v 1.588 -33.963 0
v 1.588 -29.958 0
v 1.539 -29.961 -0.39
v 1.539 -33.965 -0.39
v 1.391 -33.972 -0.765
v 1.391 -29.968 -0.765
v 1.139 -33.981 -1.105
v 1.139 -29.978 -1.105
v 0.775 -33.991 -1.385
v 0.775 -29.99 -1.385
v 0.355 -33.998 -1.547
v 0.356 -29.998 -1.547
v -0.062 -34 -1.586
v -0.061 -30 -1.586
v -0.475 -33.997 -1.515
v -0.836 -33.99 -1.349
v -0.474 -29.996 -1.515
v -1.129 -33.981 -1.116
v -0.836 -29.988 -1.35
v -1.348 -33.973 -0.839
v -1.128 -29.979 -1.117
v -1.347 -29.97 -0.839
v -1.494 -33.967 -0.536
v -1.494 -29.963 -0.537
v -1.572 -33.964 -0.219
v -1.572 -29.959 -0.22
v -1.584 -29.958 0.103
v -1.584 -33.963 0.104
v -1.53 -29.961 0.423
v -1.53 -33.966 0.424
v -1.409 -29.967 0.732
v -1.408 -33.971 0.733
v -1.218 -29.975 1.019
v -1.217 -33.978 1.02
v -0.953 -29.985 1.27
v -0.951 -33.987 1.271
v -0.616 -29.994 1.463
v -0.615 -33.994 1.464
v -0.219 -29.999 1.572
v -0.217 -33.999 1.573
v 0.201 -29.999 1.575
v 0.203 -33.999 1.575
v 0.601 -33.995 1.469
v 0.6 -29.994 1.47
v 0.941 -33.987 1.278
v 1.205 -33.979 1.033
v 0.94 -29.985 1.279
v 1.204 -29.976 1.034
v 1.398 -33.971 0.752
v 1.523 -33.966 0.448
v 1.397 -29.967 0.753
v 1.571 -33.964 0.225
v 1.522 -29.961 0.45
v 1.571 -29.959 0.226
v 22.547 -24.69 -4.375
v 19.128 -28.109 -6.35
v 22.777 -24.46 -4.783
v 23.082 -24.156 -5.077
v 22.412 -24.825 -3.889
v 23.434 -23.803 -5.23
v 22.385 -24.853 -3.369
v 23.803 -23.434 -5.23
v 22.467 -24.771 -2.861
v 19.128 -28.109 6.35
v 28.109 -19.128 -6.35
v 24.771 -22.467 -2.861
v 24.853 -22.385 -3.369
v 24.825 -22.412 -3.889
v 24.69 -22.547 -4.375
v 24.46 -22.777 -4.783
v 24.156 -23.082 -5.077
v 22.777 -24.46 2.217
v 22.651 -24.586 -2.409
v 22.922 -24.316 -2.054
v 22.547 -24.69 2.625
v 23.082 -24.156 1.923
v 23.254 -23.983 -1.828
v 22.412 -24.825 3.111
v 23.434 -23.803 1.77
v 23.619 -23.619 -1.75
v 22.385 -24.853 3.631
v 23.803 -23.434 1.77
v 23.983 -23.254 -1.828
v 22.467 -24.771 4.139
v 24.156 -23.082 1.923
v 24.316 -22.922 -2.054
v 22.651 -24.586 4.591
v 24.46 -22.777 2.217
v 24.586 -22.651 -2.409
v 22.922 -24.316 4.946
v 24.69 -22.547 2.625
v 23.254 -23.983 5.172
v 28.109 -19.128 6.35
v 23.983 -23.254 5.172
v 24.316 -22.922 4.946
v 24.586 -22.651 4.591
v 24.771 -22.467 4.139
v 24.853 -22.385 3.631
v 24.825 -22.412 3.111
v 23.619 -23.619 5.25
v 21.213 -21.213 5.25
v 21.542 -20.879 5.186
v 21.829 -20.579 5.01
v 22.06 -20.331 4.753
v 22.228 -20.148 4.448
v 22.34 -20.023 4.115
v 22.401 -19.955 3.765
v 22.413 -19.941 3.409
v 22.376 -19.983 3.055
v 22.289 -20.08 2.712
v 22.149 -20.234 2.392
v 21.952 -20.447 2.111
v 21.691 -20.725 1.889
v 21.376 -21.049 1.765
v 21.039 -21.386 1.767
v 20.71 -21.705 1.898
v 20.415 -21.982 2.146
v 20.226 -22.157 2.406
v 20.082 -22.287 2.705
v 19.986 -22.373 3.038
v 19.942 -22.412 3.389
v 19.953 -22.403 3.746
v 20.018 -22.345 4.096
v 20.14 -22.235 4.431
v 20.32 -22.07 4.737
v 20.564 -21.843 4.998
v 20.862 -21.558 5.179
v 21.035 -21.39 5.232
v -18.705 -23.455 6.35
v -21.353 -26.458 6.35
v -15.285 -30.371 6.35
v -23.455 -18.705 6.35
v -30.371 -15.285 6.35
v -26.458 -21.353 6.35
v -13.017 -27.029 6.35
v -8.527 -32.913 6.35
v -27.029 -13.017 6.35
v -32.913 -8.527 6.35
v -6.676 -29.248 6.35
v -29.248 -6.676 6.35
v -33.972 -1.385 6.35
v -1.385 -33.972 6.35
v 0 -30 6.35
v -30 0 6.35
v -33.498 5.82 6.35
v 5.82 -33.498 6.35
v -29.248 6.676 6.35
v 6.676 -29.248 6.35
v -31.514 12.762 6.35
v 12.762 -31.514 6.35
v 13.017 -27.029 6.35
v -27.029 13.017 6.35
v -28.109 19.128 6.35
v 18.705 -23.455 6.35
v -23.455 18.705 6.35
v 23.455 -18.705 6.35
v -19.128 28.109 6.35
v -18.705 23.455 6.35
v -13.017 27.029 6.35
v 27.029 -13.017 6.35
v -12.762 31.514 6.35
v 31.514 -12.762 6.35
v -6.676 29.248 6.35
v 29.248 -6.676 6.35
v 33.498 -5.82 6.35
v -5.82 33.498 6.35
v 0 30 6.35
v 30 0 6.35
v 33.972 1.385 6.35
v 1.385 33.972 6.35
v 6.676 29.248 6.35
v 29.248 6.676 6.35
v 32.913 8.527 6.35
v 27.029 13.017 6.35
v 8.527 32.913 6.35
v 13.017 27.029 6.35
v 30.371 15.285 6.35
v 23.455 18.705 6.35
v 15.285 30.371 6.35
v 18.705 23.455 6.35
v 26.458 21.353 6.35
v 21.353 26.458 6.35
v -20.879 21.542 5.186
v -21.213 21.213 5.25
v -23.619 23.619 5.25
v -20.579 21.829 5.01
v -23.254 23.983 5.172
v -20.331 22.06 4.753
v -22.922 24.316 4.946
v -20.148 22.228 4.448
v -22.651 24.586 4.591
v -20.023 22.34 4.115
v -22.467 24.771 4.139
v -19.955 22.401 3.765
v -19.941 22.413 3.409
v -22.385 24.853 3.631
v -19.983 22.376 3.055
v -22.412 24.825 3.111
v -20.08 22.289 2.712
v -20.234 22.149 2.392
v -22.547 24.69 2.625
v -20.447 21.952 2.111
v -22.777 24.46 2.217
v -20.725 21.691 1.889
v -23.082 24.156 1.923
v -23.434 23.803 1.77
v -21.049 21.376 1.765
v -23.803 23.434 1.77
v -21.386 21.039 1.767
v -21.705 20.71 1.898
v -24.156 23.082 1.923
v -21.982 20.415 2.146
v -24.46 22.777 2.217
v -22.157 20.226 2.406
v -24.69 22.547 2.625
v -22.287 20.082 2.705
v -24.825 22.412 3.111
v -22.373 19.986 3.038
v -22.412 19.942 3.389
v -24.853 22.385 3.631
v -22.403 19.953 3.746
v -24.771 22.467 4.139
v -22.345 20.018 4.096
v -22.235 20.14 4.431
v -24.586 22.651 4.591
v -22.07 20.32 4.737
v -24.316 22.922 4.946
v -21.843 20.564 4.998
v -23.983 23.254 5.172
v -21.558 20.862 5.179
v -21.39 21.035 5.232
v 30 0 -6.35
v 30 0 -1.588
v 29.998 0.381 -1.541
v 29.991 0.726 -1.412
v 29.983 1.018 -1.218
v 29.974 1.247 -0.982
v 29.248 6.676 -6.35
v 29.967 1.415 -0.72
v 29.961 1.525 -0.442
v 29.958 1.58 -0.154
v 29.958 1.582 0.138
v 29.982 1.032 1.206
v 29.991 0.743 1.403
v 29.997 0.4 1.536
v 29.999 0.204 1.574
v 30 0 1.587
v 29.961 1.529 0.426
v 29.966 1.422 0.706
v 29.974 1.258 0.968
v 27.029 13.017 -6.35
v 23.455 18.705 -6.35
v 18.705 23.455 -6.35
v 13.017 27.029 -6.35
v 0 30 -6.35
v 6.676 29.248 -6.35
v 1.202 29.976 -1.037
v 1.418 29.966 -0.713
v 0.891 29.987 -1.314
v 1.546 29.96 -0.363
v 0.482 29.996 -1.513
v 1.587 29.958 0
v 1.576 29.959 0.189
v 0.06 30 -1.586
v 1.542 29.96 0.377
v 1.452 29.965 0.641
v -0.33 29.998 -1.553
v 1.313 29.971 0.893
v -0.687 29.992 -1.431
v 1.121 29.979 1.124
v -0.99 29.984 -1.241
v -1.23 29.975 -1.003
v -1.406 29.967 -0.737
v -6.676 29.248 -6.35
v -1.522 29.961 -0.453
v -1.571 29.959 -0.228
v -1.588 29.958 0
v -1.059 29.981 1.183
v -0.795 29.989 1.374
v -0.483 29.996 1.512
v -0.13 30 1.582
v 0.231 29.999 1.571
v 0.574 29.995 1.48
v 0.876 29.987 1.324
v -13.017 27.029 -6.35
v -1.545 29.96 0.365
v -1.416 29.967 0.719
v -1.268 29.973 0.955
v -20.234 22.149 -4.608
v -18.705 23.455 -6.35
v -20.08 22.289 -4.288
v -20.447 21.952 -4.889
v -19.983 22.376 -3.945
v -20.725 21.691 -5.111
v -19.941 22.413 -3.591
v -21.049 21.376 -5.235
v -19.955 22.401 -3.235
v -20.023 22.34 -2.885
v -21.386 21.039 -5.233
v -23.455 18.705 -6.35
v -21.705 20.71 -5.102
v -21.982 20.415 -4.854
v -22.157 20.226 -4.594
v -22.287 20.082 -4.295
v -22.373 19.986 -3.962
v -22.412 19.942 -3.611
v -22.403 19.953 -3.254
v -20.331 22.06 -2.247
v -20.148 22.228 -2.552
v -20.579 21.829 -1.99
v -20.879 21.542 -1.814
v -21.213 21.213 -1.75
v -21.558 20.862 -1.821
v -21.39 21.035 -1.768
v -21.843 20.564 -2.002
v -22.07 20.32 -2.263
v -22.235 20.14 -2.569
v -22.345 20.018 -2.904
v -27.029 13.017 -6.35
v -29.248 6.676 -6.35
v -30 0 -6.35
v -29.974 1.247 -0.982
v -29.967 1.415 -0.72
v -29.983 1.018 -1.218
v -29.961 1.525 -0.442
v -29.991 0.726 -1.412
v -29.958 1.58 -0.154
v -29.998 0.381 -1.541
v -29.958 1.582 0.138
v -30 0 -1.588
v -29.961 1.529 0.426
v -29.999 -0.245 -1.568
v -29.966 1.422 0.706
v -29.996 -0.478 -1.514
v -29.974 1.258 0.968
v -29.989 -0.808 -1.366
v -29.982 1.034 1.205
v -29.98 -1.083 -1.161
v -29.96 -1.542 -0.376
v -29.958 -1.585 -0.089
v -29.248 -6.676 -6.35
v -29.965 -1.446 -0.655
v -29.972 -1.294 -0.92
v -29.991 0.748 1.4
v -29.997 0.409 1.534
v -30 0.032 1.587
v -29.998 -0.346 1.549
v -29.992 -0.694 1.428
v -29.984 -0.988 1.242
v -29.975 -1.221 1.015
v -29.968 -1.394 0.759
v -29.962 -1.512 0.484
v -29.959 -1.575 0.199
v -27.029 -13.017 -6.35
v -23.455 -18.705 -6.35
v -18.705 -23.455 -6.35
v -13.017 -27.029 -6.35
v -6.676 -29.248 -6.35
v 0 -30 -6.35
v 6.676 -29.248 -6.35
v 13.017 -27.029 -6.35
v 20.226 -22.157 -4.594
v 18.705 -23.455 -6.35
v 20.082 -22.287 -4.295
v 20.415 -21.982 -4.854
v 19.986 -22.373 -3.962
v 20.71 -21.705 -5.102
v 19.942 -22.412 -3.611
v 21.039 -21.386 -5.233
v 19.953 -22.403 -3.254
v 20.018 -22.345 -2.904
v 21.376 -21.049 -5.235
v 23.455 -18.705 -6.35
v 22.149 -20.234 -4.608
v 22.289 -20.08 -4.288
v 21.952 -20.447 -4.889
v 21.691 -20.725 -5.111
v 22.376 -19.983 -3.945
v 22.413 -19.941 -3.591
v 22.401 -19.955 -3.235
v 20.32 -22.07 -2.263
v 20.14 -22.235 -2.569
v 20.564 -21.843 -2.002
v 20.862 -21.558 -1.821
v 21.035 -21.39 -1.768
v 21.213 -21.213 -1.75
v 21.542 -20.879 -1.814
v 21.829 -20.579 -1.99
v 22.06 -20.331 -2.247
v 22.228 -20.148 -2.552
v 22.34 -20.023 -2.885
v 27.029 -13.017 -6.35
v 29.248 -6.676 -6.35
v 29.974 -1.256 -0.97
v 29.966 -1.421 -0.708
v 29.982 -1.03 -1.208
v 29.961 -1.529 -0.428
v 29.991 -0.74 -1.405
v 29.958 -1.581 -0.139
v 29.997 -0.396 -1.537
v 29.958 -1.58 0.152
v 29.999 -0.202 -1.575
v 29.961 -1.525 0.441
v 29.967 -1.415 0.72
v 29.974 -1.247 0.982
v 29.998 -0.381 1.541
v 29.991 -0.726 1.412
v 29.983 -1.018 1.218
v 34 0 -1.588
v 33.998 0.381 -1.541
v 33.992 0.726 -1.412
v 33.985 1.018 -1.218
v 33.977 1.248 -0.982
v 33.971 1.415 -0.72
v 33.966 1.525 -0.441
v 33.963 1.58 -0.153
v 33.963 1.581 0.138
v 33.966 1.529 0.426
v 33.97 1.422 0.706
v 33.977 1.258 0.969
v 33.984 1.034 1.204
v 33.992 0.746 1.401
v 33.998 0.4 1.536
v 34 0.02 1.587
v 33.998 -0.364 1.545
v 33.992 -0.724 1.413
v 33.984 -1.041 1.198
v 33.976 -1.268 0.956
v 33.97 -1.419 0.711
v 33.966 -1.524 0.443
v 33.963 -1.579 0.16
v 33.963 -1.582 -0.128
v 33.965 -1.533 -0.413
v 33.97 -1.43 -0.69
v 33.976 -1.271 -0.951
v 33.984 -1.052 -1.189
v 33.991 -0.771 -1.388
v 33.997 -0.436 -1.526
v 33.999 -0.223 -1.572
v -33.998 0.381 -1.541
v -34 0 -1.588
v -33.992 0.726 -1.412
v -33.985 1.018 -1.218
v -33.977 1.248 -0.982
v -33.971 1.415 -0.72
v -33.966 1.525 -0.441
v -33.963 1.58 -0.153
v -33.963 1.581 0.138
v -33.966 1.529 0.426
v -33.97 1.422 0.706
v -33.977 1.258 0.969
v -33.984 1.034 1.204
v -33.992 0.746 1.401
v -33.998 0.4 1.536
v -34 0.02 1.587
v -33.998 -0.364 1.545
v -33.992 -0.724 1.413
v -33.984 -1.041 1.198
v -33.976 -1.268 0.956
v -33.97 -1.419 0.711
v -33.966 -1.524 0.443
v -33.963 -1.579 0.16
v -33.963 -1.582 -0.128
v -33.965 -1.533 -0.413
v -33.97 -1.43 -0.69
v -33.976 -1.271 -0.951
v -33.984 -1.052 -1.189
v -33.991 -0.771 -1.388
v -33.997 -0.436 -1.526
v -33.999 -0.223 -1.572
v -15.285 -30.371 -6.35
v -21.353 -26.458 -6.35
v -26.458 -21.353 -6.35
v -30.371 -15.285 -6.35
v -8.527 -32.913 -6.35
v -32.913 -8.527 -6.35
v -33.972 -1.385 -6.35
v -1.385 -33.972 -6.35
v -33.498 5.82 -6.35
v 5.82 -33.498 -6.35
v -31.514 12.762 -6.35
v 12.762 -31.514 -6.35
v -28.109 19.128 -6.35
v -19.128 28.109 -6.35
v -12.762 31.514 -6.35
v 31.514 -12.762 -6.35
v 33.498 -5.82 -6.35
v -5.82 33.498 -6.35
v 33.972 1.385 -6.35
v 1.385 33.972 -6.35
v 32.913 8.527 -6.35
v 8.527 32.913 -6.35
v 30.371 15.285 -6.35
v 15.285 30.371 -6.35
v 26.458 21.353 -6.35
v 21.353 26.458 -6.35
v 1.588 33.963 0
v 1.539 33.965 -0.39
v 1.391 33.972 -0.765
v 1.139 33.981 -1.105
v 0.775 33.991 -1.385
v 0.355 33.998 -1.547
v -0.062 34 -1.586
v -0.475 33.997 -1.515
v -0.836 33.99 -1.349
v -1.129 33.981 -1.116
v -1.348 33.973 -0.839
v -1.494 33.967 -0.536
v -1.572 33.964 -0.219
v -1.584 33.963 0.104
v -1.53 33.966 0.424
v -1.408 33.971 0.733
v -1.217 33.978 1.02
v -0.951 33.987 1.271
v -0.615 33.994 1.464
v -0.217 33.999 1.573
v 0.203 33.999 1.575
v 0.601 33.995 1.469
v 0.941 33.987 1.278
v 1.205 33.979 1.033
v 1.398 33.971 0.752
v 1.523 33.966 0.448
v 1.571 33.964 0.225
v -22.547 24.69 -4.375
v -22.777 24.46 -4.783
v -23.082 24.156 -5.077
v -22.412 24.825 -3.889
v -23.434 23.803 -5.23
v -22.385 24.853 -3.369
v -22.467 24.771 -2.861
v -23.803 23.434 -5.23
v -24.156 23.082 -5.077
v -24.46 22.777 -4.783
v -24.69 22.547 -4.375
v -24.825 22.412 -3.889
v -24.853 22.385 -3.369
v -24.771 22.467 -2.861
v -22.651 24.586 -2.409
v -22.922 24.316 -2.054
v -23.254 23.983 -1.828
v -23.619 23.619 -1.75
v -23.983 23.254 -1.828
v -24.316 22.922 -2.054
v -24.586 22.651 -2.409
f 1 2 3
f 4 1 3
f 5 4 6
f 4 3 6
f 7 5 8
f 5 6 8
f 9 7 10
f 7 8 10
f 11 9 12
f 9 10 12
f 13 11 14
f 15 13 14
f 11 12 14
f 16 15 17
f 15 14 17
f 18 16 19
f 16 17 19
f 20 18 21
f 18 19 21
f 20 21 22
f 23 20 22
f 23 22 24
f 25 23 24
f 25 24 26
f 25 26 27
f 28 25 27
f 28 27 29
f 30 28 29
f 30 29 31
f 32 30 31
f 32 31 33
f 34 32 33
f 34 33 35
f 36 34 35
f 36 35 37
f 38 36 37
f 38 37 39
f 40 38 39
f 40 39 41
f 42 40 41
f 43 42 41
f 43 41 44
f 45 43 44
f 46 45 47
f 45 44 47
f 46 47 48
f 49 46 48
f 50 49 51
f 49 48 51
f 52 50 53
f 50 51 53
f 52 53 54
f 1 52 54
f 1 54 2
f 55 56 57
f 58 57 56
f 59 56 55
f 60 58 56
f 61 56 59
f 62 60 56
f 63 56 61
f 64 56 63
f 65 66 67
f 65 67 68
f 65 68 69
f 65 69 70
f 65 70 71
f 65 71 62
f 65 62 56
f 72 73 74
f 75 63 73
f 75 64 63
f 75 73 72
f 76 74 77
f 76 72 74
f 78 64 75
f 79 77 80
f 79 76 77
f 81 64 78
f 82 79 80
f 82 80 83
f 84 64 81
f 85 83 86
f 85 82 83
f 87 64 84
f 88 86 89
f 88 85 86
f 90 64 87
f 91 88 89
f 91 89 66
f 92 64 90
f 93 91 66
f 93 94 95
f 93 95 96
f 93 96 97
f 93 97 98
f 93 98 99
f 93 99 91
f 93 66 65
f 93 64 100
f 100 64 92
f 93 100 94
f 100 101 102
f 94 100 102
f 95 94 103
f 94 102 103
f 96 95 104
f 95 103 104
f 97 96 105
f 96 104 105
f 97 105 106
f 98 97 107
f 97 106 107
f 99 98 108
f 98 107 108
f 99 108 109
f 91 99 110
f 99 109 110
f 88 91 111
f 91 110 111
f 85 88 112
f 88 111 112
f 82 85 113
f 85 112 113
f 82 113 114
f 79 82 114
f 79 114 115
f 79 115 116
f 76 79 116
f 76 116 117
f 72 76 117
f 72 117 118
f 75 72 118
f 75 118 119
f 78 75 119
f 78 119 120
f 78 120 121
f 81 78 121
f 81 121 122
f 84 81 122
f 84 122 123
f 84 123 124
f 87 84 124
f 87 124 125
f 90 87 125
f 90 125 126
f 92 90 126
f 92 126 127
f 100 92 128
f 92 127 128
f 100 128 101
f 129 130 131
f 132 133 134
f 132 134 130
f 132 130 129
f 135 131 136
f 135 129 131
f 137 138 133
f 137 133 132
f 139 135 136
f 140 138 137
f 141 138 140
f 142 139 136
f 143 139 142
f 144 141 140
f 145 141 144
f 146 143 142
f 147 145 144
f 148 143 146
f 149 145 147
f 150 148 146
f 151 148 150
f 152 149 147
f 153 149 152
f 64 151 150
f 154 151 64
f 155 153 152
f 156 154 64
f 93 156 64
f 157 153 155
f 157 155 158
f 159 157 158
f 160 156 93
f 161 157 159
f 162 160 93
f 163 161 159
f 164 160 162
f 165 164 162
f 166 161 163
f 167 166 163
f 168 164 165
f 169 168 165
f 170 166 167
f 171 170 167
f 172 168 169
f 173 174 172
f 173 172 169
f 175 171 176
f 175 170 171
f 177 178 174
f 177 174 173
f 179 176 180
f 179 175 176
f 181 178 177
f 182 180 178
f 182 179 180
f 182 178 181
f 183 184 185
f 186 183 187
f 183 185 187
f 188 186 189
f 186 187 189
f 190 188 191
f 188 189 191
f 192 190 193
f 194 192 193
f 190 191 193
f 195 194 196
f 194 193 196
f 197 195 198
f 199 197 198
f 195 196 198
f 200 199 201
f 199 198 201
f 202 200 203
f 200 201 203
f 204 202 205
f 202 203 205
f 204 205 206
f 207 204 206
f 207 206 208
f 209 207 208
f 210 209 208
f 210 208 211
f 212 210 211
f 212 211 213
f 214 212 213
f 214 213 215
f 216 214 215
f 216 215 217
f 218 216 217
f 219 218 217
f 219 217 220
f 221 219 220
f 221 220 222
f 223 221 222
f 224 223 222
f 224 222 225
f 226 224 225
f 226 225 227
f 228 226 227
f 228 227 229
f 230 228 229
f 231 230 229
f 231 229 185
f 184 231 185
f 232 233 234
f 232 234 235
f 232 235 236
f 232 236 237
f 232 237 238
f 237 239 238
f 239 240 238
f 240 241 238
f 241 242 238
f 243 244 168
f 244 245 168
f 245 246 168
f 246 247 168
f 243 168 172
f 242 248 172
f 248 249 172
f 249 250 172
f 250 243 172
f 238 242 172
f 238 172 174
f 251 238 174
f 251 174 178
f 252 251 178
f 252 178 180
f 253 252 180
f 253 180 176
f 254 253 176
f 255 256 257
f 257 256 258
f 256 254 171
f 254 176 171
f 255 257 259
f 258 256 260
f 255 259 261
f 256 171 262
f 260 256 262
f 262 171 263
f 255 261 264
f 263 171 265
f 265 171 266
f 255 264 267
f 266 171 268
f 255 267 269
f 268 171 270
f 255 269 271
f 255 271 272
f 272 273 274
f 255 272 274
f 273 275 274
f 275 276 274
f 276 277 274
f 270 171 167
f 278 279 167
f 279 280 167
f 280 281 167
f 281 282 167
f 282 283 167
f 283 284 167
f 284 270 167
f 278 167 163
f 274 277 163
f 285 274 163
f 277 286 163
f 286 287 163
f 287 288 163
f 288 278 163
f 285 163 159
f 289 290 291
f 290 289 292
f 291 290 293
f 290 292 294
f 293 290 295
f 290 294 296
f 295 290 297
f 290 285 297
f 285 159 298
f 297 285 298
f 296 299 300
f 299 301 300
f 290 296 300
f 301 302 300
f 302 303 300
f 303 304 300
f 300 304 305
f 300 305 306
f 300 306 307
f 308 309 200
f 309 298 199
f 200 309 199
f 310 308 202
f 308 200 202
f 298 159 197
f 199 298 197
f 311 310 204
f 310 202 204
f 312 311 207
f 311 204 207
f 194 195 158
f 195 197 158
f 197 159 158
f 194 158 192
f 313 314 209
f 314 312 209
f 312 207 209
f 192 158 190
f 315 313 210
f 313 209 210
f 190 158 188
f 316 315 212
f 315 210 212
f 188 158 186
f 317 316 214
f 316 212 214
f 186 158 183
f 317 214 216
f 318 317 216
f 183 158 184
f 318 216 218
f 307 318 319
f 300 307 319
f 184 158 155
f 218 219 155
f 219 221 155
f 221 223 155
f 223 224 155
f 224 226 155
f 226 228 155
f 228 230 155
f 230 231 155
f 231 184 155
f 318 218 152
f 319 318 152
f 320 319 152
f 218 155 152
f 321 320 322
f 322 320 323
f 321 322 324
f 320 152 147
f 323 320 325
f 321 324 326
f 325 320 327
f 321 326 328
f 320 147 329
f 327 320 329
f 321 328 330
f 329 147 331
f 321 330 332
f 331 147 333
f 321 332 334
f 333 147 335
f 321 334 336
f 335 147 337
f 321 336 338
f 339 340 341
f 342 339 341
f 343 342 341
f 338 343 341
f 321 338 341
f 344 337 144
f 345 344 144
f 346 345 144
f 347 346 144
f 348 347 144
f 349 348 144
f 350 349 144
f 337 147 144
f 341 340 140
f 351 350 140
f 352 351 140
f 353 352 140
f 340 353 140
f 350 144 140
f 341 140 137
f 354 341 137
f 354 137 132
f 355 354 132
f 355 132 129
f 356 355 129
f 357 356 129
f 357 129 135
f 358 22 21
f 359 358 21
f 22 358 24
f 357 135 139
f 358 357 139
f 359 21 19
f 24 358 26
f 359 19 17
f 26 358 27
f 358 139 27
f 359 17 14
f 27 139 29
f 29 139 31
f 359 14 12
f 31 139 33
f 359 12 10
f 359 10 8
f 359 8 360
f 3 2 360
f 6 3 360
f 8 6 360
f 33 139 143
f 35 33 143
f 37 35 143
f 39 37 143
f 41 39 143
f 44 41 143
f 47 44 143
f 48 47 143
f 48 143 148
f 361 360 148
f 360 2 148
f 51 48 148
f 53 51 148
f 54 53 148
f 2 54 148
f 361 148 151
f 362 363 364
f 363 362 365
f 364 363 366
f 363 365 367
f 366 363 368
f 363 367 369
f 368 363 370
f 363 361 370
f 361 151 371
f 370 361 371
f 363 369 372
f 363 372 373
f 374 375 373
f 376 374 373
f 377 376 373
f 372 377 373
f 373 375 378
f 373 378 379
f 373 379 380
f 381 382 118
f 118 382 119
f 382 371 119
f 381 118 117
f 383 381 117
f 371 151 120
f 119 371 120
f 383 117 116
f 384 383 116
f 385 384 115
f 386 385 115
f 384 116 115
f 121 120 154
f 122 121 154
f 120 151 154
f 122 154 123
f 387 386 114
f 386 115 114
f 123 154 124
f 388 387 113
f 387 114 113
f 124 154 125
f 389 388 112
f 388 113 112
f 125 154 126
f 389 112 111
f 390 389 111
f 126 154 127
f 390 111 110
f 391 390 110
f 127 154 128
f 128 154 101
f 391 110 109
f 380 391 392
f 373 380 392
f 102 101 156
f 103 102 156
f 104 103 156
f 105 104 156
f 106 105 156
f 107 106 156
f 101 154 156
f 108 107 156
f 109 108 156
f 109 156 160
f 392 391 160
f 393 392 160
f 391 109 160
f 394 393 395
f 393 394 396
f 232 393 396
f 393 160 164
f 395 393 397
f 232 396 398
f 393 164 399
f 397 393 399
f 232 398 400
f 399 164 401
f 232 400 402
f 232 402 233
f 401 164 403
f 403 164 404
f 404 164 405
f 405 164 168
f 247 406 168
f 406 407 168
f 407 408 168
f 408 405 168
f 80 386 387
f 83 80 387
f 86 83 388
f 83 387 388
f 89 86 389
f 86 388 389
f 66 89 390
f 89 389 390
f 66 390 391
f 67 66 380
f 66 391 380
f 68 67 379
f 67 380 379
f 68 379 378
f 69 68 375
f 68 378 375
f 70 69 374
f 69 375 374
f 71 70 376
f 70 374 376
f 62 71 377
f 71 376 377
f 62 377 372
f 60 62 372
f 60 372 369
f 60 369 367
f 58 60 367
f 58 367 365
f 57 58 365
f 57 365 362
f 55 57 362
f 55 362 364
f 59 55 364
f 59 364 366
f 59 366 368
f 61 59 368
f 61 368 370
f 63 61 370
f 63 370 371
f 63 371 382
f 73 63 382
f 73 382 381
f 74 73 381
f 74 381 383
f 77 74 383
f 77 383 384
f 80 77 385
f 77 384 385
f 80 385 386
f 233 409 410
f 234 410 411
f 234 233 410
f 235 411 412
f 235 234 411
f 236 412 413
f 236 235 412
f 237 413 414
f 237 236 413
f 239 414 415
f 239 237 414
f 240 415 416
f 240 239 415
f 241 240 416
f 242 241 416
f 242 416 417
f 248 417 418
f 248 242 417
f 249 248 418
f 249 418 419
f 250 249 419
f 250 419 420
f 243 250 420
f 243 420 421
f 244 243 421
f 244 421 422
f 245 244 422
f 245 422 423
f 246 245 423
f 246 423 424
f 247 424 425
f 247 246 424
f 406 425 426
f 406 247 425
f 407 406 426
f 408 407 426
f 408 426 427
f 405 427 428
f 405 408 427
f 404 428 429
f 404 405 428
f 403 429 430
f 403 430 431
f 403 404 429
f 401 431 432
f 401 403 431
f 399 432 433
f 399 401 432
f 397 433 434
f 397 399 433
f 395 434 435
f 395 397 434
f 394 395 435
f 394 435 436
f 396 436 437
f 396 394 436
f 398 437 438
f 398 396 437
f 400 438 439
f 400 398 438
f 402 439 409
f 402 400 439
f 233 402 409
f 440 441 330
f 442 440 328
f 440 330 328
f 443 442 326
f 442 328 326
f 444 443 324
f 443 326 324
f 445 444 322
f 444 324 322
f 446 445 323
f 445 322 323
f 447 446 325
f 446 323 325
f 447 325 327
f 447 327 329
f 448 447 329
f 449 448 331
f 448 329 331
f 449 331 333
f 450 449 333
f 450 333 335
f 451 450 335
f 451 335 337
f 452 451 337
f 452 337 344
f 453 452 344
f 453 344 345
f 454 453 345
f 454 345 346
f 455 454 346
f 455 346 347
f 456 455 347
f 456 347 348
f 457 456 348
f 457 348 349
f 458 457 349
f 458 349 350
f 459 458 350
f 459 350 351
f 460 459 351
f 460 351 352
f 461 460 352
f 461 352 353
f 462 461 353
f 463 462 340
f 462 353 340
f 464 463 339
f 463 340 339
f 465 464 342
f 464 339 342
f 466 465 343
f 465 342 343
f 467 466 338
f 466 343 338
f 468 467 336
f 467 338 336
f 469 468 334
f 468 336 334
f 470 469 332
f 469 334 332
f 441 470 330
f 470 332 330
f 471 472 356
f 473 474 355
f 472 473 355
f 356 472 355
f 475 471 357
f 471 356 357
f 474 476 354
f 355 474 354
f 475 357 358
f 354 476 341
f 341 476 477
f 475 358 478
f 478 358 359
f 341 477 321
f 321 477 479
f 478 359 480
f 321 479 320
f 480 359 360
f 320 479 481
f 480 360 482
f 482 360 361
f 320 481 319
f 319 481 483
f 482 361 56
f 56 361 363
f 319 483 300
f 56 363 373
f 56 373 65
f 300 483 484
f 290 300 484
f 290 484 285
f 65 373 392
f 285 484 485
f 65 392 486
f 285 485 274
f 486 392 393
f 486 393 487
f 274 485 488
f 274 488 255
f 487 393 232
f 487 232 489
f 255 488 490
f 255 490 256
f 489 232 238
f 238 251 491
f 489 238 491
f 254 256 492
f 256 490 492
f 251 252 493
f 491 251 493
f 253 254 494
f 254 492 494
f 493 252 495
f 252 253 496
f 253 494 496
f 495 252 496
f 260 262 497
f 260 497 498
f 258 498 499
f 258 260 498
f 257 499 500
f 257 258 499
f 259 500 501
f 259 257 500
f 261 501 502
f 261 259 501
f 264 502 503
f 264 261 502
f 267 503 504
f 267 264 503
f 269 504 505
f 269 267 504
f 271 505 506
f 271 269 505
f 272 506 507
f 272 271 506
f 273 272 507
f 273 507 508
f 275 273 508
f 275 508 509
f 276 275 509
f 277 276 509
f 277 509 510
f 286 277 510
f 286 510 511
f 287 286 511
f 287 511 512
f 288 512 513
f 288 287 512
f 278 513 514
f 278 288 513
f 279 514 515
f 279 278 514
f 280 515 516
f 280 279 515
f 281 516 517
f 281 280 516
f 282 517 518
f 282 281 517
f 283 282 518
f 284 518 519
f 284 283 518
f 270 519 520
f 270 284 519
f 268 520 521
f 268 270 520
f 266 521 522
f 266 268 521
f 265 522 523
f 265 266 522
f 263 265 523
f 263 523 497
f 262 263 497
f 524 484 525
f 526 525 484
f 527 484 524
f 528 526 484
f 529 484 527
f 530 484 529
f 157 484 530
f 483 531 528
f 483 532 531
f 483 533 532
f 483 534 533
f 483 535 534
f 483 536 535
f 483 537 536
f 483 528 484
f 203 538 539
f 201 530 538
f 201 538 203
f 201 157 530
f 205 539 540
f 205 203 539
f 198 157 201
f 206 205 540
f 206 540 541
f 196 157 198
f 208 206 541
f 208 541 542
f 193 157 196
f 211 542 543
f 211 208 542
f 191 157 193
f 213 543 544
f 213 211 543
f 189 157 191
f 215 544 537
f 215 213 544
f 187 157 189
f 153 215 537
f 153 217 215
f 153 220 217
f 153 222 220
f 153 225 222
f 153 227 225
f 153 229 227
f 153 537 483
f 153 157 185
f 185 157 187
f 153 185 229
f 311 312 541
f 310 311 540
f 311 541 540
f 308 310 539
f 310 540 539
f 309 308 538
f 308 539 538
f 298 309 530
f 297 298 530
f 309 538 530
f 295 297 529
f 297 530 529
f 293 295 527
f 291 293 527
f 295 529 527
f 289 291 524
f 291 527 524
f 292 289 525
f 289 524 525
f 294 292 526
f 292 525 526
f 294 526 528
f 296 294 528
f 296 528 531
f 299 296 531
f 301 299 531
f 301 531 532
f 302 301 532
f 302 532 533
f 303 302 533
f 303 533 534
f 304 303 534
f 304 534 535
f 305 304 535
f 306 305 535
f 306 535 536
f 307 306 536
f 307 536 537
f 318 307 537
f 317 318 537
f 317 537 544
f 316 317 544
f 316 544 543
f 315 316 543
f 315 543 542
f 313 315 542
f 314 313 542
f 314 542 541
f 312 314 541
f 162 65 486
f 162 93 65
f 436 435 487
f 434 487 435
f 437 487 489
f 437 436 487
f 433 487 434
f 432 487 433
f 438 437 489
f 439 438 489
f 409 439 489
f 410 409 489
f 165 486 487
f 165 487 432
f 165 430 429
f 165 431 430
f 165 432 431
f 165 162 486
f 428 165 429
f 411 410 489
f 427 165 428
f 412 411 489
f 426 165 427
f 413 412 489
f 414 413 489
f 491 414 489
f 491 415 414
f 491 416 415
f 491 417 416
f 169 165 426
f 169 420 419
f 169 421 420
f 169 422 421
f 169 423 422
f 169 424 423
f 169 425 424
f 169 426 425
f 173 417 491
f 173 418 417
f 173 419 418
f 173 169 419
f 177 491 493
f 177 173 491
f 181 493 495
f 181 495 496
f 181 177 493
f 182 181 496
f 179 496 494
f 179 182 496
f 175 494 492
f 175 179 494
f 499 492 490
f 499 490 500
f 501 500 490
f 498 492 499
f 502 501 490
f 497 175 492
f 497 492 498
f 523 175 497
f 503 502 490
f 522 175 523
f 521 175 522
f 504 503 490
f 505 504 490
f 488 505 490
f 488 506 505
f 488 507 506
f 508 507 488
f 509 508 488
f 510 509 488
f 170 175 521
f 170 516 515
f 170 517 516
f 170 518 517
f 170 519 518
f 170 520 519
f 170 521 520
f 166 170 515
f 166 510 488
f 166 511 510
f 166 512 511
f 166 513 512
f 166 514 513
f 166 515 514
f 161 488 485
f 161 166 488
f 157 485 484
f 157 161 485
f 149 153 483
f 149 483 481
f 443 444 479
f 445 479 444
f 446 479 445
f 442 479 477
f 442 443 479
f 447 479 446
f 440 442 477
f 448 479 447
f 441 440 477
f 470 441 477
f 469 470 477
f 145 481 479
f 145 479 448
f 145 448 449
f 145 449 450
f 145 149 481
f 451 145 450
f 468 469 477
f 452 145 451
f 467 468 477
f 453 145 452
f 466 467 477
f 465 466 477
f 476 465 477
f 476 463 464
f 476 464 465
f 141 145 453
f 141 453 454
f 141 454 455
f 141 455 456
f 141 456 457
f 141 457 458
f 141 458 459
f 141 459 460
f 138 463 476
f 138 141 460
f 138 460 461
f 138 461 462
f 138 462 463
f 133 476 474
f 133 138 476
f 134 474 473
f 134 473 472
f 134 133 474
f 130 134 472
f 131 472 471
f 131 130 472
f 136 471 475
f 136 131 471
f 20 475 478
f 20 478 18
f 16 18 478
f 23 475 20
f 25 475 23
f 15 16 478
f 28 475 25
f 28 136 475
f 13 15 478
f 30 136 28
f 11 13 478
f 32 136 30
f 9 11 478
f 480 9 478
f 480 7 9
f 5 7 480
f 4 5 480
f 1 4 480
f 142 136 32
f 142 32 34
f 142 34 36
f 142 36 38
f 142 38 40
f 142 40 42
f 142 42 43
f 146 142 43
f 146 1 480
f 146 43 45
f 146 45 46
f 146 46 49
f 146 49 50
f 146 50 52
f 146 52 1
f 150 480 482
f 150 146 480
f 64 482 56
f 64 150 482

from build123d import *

# Parameters (mm, degrees)
CROQUIS1_R                   = 30
SALIENTE_EXTRUIR1_DEPTH      = 6.35
SALIENTE_EXTRUIR1_DEPTH_BACK = 6.35
CROQUIS3_R                   = 1.5875
CORTAR_EXTRUIR1_DEPTH        = 35
CORTAR_EXTRUIR1_DEPTH_BACK   = 35
CROQUIS4_R                   = 1.5875
CORTAR_EXTRUIR2_DEPTH        = 35.0000001
CORTAR_EXTRUIR2_DEPTH_BACK   = 35.0000001
CROQUIS5_R                   = 1.75
CORTAR_EXTRUIR3_DEPTH        = 82.485020219


with BuildPart() as part:
    # Croquis1 → Saliente-Extruir1 (new body, two sides)
    with BuildSketch(Plane.XY) as saliente_extruir1_sk:
        with BuildLine():
            Line((-19.128482186, 28.108738308), (-28.108738308, 19.128482186))
            ThreePointArc((-28.108738308, 19.128482186), (-24.04163056, -24.04163056), (19.128482186, -28.108738308))
            Line((19.128482186, -28.108738308), (28.108738308, -19.128482186))
            ThreePointArc((28.108738308, -19.128482186), (24.04163056, 24.04163056), (-19.128482186, 28.108738308))
        make_face()
        Circle(CROQUIS1_R, mode=Mode.SUBTRACT)
    extrude(amount=SALIENTE_EXTRUIR1_DEPTH)
    extrude(saliente_extruir1_sk.sketch, amount=-SALIENTE_EXTRUIR1_DEPTH_BACK)

    # Croquis3 → Cortar-Extruir1 (cut, two sides)
    with BuildSketch(Plane(origin=(0, 0, 0), x_dir=(1, 0, 0), z_dir=(0, 1, 0))) as cortar_extruir1_sk:
        Circle(CROQUIS3_R)
    extrude(amount=CORTAR_EXTRUIR1_DEPTH, mode=Mode.SUBTRACT)
    extrude(cortar_extruir1_sk.sketch, amount=-CORTAR_EXTRUIR1_DEPTH_BACK, mode=Mode.SUBTRACT)

    # Croquis4 → Cortar-Extruir2 (cut, two sides)
    with BuildSketch(Plane(origin=(0, 0, 0), x_dir=(0, 0, -1), z_dir=(1, 0, 0))) as cortar_extruir2_sk:
        Circle(CROQUIS4_R)
    extrude(amount=CORTAR_EXTRUIR2_DEPTH, mode=Mode.SUBTRACT)
    extrude(cortar_extruir2_sk.sketch, amount=-CORTAR_EXTRUIR2_DEPTH_BACK, mode=Mode.SUBTRACT)

    # Croquis5 → Cortar-Extruir3 (cut, through all)
    with BuildSketch(Plane(origin=(-23.618610247, 23.618610247, 0), x_dir=(0, 0, 1), z_dir=(-0.707106781, 0.707106781, 0))):
        with Locations((-3.5, 0)):
            Circle(CROQUIS5_R)
        with Locations((3.5, 0)):
            Circle(CROQUIS5_R)
    extrude(amount=-CORTAR_EXTRUIR3_DEPTH, mode=Mode.SUBTRACT)


solid = part.part
